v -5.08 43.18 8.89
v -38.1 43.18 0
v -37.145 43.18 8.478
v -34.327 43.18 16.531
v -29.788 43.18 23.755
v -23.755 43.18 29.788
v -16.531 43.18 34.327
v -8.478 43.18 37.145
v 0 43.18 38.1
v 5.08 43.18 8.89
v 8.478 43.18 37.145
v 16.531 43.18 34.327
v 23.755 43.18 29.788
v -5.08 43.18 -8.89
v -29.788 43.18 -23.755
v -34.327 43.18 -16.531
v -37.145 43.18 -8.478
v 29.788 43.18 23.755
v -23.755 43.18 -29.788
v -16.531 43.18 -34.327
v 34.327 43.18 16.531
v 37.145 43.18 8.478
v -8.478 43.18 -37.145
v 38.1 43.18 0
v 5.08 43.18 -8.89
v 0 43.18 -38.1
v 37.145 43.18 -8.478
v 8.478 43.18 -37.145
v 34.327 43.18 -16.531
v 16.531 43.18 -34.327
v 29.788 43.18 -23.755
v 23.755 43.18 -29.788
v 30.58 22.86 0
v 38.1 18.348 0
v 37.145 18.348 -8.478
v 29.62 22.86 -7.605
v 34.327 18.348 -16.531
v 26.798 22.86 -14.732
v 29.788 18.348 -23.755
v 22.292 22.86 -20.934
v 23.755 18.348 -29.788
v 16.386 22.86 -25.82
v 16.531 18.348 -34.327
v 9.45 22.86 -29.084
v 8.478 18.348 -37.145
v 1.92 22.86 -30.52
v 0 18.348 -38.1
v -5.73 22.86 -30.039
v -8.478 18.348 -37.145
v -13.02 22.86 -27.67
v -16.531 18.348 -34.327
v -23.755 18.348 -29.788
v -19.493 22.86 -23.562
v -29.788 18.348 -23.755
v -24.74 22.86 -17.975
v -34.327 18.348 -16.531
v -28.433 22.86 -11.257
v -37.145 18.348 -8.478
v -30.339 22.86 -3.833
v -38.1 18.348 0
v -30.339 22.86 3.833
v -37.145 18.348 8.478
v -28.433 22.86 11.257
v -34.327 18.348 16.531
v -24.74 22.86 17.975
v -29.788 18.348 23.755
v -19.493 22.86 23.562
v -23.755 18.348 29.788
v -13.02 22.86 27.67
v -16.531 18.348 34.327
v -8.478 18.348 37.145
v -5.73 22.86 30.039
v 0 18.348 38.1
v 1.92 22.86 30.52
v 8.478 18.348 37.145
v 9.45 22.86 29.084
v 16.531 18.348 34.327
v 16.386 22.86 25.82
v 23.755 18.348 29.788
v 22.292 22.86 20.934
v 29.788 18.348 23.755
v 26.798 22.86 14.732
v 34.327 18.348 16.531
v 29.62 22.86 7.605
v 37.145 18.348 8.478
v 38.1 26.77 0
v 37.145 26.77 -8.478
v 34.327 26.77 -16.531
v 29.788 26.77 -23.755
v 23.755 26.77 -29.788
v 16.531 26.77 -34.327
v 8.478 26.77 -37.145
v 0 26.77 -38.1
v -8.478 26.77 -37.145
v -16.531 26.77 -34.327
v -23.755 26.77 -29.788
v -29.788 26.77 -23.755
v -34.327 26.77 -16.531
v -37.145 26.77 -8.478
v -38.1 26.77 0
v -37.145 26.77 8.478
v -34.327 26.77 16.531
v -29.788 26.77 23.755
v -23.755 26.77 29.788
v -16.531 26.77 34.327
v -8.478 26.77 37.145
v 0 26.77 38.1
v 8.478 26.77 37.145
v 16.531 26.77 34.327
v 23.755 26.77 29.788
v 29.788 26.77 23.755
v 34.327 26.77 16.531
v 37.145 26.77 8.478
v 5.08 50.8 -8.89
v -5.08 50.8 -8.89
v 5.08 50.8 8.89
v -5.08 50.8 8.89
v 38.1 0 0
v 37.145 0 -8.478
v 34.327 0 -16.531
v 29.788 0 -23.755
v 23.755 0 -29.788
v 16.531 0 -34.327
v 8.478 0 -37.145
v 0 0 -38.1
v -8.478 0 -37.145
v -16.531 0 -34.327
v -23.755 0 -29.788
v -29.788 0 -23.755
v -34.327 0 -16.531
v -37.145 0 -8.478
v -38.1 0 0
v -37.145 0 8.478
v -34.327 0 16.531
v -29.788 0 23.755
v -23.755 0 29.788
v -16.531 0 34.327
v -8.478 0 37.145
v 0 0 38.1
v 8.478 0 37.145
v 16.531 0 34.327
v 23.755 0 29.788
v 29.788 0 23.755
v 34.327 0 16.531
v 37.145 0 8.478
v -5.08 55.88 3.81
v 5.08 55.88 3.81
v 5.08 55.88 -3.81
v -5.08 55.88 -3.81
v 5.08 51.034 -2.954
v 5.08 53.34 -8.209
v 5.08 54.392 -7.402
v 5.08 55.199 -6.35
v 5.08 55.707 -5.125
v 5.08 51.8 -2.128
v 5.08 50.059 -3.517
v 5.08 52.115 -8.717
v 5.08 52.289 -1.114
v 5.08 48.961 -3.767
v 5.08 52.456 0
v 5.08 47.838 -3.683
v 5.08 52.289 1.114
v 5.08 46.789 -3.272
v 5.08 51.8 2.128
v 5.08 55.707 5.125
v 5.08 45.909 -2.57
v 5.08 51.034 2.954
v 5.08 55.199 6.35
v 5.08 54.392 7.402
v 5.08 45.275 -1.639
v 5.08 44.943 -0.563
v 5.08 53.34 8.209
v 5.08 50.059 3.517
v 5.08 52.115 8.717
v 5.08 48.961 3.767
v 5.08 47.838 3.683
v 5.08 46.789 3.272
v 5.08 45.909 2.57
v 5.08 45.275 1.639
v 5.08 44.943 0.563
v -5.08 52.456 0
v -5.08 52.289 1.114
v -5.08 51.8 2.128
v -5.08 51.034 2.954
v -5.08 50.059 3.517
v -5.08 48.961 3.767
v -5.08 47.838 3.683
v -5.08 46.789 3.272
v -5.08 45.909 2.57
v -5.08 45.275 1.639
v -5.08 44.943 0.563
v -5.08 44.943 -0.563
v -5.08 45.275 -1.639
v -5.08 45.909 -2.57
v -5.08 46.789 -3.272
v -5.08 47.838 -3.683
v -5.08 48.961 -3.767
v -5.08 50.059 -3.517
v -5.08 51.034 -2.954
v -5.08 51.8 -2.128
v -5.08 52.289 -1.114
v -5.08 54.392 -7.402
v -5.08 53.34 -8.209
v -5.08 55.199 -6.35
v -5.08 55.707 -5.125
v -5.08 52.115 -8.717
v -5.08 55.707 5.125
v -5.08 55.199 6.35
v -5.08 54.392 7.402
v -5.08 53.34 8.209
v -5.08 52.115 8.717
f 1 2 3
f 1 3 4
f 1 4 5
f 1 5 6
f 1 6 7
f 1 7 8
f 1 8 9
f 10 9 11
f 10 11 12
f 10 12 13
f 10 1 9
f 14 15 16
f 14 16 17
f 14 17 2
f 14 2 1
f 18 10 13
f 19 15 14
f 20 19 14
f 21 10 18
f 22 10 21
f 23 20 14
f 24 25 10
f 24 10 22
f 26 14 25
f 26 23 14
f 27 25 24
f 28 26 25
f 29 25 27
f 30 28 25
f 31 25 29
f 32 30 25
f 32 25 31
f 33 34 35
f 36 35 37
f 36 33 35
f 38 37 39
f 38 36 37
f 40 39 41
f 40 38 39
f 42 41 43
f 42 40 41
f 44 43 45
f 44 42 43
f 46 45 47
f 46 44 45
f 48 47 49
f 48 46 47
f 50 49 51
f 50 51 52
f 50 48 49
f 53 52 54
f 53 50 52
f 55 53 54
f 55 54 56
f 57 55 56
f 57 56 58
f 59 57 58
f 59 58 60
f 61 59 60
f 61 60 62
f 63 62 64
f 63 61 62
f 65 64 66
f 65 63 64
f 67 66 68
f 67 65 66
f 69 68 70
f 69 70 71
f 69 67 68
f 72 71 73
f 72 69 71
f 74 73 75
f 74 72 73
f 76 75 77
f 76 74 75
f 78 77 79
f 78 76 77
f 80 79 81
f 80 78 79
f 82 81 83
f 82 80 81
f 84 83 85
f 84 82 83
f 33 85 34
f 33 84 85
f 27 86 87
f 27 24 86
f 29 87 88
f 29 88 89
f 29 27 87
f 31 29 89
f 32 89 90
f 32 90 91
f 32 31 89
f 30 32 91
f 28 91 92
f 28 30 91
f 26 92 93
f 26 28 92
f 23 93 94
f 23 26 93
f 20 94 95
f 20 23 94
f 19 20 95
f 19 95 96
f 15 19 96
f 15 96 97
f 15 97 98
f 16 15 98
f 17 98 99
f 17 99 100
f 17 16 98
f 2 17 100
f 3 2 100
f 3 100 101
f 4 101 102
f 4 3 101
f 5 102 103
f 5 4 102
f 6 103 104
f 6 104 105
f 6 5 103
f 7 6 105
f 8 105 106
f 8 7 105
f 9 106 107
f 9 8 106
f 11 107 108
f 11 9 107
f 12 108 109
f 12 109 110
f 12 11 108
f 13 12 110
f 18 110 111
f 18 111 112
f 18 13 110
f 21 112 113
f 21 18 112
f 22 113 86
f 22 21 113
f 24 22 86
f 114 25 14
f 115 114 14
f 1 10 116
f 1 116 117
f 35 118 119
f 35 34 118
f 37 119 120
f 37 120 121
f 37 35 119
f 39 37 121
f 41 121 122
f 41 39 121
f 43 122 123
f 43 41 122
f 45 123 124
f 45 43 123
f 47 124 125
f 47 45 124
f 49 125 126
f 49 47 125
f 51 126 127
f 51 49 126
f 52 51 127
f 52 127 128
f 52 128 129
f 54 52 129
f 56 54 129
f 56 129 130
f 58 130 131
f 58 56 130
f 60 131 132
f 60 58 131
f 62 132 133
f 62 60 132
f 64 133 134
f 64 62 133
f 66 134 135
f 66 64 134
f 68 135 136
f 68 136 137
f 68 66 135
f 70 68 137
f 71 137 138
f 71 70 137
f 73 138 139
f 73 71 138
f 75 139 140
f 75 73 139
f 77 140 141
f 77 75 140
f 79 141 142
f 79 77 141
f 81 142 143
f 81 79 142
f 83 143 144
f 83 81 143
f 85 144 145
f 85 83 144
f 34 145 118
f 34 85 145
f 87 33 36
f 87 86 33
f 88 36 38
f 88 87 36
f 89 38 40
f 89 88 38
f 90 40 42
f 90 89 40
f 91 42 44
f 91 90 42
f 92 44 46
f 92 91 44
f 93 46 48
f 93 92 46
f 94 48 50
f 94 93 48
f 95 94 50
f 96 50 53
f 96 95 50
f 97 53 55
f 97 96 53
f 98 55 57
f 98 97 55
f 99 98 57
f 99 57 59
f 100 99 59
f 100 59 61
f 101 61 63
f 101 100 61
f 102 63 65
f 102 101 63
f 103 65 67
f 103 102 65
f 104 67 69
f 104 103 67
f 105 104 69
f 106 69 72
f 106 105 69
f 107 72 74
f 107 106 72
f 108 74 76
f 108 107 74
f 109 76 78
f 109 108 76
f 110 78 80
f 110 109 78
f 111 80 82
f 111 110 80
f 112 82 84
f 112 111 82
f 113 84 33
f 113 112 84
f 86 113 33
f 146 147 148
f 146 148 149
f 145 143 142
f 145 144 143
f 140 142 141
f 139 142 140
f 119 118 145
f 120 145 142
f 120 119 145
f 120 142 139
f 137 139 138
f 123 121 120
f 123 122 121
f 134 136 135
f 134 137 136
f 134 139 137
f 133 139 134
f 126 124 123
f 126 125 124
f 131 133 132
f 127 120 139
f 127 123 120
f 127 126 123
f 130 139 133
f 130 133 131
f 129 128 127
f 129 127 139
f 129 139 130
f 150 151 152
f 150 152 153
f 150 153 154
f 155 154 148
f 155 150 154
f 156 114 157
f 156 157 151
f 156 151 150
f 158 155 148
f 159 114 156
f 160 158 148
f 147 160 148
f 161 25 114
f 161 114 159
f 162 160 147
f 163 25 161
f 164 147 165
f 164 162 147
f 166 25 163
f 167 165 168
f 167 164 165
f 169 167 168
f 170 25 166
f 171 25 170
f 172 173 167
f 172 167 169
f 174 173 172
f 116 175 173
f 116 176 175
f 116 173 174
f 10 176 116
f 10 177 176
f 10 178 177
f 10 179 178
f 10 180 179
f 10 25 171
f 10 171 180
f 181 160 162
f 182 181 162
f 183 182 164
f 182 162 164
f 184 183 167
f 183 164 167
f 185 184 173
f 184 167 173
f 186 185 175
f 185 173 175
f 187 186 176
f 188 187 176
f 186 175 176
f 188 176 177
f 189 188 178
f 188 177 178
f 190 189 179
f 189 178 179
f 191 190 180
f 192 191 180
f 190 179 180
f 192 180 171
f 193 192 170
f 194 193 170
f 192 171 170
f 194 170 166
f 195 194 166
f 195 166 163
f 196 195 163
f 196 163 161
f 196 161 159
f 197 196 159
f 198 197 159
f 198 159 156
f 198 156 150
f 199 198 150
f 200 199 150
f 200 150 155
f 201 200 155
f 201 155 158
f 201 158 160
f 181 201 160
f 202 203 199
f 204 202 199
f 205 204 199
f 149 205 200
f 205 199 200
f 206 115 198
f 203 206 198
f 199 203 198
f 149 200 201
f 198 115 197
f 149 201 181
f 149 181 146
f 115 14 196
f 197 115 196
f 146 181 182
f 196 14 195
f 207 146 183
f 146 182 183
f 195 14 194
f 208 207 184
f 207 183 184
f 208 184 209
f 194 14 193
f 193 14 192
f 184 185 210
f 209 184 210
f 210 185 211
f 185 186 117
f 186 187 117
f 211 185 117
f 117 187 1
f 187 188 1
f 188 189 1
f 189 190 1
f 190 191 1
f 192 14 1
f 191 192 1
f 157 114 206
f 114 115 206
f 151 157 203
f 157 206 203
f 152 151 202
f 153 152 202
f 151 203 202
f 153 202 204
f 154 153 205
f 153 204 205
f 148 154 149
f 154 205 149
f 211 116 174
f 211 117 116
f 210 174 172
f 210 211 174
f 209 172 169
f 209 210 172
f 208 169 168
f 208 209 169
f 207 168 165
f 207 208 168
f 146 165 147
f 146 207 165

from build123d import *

# Parameters (mm, degrees)
F2_W     = 10.16
F2_H     = 17.78
F3_DEPTH = 12.7
F4_R     = 5.08
F5_R     = 3.777996
F6_DEPTH = 25.4


with BuildPart() as f1:
    # F0 (on Top) → F1 (revolve)
    with BuildSketch(Plane.XY):
        Polygon((0, 0), (38.1, 0), (38.1, 18.348159), (30.580265, 22.860002), (38.1, 26.770264), (38.1, 43.18), (0, 43.18), align=None)
    revolve(axis=Axis((0, 21.59, 0), (0, 1, 0)))

    # F2 (on face) → F3 (join)
    with BuildSketch(Plane(origin=(0, 43.18, 0), x_dir=(-1, 0, 0), z_dir=(0, 1, 0))):
        Rectangle(F2_W, F2_H)
    extrude(amount=F3_DEPTH)

    # F4
    f4_edges = [f1.edges().sort_by_distance(p)[0] for p in [
        (0, 55.88, 8.89),
        (0, 55.88, -8.89),
    ]]
    fillet(f4_edges, radius=F4_R)

    # F5 (on face) → F6 (cut)
    with BuildSketch(Plane.YZ.offset(5.08)):
        with Locations((48.678428, 0)):
            Circle(F5_R)
    extrude(amount=-F6_DEPTH, mode=Mode.SUBTRACT)


solid = f1.part
